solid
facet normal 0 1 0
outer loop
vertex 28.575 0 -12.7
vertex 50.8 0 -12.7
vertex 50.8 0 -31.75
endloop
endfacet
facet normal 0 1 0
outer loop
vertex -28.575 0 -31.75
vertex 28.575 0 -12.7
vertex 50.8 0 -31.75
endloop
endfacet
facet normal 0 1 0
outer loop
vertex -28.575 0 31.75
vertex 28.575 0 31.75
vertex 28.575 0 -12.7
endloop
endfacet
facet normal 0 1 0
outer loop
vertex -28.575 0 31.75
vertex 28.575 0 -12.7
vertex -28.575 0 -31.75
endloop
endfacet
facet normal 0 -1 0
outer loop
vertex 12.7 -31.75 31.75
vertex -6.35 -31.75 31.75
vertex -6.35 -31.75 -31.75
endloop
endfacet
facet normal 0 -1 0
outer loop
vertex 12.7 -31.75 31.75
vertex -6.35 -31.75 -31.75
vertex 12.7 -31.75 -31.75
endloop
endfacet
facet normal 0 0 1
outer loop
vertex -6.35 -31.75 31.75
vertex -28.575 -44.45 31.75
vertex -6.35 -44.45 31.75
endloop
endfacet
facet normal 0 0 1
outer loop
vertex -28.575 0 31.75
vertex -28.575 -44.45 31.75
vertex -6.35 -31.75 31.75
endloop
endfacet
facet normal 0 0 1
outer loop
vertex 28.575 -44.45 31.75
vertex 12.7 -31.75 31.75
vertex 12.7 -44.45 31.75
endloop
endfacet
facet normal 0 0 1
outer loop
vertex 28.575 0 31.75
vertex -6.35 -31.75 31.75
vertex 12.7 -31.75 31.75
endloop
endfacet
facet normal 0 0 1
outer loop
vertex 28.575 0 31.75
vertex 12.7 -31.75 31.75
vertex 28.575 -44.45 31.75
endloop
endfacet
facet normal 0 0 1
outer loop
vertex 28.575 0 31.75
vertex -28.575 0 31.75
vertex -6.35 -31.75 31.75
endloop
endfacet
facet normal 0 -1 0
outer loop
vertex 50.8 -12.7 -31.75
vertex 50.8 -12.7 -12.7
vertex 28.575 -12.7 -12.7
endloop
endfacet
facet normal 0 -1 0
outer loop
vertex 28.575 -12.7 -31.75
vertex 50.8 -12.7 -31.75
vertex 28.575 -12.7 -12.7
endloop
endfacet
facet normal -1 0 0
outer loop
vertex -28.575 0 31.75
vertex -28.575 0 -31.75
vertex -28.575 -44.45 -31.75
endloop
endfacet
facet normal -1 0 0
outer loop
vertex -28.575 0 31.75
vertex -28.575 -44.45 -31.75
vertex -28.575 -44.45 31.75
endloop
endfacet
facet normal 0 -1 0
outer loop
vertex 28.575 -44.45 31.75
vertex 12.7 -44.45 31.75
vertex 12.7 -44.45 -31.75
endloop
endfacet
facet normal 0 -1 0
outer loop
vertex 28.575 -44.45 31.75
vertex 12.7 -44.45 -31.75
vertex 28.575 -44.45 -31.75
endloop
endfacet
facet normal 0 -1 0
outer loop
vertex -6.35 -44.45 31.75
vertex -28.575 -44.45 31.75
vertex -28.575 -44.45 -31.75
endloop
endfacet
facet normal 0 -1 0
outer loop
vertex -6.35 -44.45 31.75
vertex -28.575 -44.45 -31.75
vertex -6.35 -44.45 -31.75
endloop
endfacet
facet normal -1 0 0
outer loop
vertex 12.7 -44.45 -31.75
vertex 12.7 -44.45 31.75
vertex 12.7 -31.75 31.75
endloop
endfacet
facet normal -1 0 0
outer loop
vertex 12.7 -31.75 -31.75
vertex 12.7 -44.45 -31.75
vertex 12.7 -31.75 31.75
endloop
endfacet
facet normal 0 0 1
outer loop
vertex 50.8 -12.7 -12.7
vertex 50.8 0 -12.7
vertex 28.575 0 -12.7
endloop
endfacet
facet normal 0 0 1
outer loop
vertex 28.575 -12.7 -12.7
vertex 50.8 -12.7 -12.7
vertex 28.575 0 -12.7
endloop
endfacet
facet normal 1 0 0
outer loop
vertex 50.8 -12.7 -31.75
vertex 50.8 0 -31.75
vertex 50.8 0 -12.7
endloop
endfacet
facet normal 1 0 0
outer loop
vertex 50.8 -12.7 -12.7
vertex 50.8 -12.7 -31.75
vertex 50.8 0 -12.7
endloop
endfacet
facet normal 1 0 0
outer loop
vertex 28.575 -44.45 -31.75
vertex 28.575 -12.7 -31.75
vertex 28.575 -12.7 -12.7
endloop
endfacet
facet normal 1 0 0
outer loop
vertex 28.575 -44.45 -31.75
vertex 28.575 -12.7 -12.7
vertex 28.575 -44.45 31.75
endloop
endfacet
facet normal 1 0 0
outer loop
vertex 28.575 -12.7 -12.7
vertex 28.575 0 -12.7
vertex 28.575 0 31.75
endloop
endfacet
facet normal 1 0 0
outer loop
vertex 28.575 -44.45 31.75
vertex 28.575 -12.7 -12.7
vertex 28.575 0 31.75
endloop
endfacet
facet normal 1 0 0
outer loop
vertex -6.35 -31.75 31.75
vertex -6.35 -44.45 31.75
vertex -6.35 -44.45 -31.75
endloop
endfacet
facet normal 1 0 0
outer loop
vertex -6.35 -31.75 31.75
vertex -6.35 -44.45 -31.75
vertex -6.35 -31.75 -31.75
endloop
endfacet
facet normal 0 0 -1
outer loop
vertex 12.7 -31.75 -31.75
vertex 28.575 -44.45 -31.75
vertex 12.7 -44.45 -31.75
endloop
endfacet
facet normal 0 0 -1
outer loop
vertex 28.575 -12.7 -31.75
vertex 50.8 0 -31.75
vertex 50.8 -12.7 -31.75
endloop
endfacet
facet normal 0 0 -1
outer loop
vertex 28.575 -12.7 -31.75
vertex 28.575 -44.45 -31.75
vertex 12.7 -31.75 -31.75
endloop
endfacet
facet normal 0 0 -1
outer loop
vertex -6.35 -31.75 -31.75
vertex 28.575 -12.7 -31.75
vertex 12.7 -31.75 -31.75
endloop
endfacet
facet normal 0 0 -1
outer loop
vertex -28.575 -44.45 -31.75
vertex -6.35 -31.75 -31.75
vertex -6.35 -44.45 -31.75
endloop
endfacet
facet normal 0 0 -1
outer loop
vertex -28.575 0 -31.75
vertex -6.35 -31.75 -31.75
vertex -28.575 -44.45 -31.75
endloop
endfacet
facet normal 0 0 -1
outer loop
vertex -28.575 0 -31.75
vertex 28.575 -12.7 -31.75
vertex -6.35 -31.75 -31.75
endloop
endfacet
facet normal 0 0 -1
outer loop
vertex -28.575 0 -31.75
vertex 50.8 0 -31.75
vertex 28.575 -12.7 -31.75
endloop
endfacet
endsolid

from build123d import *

# Parameters (mm, degrees)
F0_W     = 57.15
F0_H     = 63.5
F1_DEPTH = 44.45
F2_W     = 22.225
F2_H     = 19.05
F3_DEPTH = 12.7
F4_W     = 19.05
F4_H     = 12.7
F5_DEPTH = 63.501


with BuildPart() as f1:
    # F0 (on Front) → F1 (new body)
    with BuildSketch(Plane.XZ):
        Rectangle(F0_W, F0_H)
    extrude(amount=F1_DEPTH)

    # F2 (on face) → F3 (join)
    with BuildSketch(Plane(origin=(0, 0, 0), x_dir=(-1, 0, 0), z_dir=(0, 1, 0))):
        with Locations((-39.6875, -22.225)):
            Rectangle(F2_W, F2_H)
    extrude(amount=-F3_DEPTH)

    # F4 (on face) → F5 (cut, through all)
    with BuildSketch(Plane.XY.offset(31.75)):
        with Locations((3.175, -38.1)):
            Rectangle(F4_W, F4_H)
    extrude(amount=-F5_DEPTH, mode=Mode.SUBTRACT)


solid = f1.part
